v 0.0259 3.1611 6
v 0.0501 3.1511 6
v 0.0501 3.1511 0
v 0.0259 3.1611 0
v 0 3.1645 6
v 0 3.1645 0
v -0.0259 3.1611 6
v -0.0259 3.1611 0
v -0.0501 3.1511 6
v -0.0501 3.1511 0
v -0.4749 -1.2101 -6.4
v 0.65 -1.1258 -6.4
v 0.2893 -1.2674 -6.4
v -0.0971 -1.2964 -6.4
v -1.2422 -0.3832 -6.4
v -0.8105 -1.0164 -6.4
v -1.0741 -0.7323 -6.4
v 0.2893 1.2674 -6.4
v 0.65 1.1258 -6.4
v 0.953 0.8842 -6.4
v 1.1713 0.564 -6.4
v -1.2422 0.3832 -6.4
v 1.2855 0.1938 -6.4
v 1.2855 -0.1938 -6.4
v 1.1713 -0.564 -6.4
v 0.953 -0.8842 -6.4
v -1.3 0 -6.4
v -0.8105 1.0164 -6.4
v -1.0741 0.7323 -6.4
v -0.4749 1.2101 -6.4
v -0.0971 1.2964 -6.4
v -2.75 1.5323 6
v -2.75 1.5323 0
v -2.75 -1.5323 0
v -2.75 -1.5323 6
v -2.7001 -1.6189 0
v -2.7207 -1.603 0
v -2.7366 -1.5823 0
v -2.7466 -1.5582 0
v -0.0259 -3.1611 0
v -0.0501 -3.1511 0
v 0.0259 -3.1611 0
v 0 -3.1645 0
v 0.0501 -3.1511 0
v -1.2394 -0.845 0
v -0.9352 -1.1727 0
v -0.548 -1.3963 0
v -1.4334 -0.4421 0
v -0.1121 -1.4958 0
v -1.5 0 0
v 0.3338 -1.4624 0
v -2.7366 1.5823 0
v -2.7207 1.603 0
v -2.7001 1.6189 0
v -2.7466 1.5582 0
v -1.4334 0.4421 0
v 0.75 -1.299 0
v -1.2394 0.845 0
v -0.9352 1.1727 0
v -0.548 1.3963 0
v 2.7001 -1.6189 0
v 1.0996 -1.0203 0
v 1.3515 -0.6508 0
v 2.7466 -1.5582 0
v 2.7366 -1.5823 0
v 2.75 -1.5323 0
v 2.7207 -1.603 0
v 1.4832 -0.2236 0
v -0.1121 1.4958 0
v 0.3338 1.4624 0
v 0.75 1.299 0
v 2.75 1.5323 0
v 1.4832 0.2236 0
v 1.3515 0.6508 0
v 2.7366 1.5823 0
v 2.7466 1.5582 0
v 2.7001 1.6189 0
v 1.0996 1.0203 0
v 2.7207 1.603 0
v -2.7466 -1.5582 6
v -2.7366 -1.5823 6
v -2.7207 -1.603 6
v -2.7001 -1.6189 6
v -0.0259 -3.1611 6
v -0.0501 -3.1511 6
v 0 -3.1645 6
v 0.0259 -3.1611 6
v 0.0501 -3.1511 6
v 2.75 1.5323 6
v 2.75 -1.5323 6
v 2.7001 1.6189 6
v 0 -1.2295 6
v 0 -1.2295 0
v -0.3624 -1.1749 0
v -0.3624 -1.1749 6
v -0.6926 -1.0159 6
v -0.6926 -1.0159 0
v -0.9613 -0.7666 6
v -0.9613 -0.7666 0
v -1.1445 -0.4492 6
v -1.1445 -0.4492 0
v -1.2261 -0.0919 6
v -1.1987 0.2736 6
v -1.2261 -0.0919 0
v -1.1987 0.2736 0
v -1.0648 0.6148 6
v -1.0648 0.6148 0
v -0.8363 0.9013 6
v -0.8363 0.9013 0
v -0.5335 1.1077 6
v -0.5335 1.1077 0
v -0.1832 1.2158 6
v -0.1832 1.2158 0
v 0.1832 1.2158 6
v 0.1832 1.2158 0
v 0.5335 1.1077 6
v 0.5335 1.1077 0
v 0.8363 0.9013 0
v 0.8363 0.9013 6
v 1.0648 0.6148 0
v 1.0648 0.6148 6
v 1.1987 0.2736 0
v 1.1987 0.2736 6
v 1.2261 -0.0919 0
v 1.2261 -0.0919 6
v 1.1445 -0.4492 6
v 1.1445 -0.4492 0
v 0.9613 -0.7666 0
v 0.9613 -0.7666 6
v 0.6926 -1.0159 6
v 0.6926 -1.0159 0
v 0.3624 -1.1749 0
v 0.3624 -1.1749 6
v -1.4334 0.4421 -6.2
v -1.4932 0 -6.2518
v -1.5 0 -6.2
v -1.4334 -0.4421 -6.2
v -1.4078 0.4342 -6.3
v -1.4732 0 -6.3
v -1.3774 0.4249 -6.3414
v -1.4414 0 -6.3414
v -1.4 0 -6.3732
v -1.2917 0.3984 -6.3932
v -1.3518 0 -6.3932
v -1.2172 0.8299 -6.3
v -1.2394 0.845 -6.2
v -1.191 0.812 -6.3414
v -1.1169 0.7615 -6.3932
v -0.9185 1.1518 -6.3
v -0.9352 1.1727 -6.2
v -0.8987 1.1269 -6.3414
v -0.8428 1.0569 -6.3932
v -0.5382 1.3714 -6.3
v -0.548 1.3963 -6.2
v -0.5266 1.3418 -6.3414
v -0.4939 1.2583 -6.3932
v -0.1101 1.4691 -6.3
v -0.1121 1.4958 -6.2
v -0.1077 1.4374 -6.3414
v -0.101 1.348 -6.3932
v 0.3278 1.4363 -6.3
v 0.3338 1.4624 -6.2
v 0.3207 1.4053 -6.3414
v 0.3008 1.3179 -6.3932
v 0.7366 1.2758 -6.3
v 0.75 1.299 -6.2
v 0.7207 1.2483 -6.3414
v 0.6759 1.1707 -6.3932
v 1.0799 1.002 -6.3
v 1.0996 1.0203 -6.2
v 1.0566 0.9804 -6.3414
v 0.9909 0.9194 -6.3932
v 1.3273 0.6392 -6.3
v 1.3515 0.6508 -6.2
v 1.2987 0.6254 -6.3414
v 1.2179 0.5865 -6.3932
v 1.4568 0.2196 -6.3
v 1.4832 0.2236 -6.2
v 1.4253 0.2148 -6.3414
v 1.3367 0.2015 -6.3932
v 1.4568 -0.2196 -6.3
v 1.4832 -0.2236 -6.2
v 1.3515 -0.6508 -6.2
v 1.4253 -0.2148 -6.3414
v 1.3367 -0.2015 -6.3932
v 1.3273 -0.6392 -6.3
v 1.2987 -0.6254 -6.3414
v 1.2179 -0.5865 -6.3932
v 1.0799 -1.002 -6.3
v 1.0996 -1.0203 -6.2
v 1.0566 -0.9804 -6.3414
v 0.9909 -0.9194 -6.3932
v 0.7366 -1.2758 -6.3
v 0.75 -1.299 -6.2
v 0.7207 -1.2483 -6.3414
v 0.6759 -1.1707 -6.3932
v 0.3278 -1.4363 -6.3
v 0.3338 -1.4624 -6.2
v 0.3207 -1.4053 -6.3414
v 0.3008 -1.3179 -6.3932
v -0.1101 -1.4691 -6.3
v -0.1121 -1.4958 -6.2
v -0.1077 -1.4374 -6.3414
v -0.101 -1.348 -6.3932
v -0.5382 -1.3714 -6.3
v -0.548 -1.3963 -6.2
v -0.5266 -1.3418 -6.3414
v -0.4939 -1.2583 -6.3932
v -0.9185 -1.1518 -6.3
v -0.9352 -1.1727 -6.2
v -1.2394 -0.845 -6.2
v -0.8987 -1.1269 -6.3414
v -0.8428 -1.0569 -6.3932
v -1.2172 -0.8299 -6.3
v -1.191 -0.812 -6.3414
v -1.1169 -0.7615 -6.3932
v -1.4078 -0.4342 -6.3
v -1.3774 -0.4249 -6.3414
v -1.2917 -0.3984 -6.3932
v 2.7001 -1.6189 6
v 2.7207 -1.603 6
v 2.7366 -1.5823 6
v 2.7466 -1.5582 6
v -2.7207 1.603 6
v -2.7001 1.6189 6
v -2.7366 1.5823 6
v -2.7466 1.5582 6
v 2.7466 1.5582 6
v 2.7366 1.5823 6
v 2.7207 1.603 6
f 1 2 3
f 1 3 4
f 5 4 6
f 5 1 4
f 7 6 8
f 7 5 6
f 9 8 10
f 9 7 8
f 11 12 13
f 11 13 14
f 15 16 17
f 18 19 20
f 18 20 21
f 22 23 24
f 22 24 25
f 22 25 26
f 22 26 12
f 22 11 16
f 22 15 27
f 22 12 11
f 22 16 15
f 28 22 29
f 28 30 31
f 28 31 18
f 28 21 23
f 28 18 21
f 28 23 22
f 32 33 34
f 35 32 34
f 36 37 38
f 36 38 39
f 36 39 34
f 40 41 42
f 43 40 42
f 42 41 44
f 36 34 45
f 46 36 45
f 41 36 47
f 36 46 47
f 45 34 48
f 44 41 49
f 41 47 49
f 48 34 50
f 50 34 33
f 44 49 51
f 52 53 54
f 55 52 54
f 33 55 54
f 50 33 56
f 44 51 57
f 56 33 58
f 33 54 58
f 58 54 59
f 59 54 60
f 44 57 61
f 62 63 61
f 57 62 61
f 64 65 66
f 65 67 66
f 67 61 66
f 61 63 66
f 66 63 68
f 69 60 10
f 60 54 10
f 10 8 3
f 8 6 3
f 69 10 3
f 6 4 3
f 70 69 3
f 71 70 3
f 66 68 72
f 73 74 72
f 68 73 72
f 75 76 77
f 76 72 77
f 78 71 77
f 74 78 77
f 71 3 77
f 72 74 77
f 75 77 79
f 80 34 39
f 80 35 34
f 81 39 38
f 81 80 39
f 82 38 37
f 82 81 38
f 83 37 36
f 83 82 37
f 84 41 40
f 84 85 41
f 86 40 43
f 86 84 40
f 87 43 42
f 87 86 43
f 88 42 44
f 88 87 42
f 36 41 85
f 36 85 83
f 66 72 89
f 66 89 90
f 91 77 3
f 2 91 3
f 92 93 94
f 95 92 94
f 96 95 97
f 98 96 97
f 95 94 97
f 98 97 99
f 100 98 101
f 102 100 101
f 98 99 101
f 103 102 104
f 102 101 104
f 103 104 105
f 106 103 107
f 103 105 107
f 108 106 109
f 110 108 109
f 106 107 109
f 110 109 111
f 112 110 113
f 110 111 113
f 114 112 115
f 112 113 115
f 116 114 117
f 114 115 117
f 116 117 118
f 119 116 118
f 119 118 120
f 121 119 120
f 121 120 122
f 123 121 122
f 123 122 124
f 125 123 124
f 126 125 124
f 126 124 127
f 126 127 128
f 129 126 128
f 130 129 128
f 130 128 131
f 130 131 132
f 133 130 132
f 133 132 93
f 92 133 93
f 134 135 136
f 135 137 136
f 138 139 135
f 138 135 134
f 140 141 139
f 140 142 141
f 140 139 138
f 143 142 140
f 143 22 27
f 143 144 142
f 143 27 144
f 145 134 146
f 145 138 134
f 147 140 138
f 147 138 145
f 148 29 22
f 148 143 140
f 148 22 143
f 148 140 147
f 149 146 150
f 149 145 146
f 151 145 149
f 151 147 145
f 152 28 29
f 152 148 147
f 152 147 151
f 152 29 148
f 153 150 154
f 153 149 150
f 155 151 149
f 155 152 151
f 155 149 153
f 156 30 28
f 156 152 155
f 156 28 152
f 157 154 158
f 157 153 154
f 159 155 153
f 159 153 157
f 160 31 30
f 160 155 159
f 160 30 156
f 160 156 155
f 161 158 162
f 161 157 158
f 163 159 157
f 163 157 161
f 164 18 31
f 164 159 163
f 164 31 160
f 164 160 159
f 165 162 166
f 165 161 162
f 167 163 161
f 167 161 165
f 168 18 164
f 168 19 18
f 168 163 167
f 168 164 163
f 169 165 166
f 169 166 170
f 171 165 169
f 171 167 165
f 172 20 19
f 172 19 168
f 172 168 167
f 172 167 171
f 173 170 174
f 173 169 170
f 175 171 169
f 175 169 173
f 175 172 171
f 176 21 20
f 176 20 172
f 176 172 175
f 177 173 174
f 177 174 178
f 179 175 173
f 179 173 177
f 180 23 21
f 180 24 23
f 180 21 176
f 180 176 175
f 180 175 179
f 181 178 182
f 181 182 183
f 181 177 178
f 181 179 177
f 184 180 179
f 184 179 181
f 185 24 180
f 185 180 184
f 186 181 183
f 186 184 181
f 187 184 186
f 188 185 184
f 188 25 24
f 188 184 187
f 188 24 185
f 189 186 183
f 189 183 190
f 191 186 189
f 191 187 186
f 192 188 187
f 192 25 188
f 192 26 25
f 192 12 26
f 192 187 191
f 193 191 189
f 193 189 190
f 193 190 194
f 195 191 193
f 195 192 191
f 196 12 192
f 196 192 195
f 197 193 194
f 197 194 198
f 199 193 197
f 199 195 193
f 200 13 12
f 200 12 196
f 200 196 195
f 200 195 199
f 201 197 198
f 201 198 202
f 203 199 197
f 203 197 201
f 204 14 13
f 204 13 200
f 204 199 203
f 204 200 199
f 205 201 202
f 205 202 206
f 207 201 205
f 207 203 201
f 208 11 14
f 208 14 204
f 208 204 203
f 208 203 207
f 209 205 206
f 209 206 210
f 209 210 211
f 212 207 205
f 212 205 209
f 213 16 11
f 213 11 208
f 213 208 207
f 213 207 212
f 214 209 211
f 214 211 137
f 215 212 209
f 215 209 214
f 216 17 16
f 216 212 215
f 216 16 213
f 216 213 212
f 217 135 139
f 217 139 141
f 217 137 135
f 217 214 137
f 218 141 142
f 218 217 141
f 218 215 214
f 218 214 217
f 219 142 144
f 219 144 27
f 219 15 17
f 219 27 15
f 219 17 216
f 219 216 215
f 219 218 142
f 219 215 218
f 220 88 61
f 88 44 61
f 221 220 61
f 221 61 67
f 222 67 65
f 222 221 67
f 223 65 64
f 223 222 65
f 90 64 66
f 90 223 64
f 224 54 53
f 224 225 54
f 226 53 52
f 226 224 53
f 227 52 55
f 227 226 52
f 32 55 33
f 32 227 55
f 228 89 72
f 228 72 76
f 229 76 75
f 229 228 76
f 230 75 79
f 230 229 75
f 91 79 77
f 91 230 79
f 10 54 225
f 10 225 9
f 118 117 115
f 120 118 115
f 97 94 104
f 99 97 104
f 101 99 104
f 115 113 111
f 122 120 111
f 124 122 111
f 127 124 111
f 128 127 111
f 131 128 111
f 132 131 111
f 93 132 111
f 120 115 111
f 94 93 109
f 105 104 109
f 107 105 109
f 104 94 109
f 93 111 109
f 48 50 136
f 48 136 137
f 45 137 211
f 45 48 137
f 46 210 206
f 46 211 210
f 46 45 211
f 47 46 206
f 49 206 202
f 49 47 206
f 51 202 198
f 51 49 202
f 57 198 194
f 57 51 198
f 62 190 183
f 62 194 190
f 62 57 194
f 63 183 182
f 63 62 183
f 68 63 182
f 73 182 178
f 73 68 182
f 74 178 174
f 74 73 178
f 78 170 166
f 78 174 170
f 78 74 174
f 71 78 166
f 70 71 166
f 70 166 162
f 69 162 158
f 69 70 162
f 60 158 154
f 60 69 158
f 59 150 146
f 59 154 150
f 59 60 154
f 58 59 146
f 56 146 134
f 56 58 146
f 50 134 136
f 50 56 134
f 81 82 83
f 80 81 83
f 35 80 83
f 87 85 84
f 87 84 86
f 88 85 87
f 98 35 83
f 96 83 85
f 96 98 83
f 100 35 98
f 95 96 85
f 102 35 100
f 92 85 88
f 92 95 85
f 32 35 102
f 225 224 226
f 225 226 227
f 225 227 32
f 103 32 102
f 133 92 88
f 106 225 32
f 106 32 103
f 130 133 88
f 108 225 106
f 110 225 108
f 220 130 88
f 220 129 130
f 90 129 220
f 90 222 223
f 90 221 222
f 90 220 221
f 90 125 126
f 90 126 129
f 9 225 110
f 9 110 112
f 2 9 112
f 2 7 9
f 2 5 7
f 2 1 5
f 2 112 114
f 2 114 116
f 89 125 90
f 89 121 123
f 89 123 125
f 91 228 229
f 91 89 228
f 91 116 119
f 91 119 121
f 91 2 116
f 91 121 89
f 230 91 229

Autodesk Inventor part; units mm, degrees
ref_plane "YZ Plane" through (0, 0, 0) normal (1, 0, 0) x (0, 1, 0)
ref_plane "XZ Plane" through (0, 0, 0) normal (0, 1, 0) x (-1, 0, 0)
ref_plane "XY Plane" through (0, 0, 0) normal (0, 0, 1) x (1, 0, 0)
sketch "Sketch1" plane through (0, 0, 0) normal (0, 0, 1) x (1, 0, 0)
  line L0 (-2.75, 1.59) -> (0, 3.18)
  line L1 (0, -3.18) -> (-2.75, -1.59)
  line L2 (-2.75, 1.59) -> (-2.75, -1.59)
  line L3 (2.75, 1.59) -> (0, 3.18)
  line L4 (0, -3.18) -> (2.75, -1.59)
  line L5 (2.75, 1.59) -> (2.75, -1.59)
  point P0 (0, 0)
extrude "Extrusion1" add sketch "Sketch1" along normal blind 6
sketch "Sketch2" plane through (0, 0, 6) normal (0, 0, 1) x (1, 0, 0)
  circle A0 centre (0, 0) radius 1.5
  dimension "d20" = 3
hole "Hole1" at (0, 0, 6) direction (0, 0, -1) diameter 2.459 depth 8.8 tip angle 118 thread size "M3x0.5" class "6H" standard "ISO Metric profile"
fillet "Fillet1" radius 0.1 6 edges at (0, 3.18, 3) (2.75, 1.59, 3) (-2.75, 1.59, 3) (2.75, -1.59, 3) (0, -3.18, 3) (-2.75, -1.59, 3)
sketch "Sketch4" plane through (0, 0, 0) normal (0, 0, -1) x (-1, 0, 0)
  circle A0 centre (0, 0) radius 1.5
  dimension "d29" = 3
extrude "Extrusion2" add sketch "Sketch4" along normal blind 6.4
thread "Thread1" size "M3x0.5" class "6g" standard "ANSI Metric M Profile" length 9.967
fillet "Fillet2" radius 0.2 1 edges at (1.5, 0, -6.4)
properties part number "spacer 3cm" material "Steel, Mild"
